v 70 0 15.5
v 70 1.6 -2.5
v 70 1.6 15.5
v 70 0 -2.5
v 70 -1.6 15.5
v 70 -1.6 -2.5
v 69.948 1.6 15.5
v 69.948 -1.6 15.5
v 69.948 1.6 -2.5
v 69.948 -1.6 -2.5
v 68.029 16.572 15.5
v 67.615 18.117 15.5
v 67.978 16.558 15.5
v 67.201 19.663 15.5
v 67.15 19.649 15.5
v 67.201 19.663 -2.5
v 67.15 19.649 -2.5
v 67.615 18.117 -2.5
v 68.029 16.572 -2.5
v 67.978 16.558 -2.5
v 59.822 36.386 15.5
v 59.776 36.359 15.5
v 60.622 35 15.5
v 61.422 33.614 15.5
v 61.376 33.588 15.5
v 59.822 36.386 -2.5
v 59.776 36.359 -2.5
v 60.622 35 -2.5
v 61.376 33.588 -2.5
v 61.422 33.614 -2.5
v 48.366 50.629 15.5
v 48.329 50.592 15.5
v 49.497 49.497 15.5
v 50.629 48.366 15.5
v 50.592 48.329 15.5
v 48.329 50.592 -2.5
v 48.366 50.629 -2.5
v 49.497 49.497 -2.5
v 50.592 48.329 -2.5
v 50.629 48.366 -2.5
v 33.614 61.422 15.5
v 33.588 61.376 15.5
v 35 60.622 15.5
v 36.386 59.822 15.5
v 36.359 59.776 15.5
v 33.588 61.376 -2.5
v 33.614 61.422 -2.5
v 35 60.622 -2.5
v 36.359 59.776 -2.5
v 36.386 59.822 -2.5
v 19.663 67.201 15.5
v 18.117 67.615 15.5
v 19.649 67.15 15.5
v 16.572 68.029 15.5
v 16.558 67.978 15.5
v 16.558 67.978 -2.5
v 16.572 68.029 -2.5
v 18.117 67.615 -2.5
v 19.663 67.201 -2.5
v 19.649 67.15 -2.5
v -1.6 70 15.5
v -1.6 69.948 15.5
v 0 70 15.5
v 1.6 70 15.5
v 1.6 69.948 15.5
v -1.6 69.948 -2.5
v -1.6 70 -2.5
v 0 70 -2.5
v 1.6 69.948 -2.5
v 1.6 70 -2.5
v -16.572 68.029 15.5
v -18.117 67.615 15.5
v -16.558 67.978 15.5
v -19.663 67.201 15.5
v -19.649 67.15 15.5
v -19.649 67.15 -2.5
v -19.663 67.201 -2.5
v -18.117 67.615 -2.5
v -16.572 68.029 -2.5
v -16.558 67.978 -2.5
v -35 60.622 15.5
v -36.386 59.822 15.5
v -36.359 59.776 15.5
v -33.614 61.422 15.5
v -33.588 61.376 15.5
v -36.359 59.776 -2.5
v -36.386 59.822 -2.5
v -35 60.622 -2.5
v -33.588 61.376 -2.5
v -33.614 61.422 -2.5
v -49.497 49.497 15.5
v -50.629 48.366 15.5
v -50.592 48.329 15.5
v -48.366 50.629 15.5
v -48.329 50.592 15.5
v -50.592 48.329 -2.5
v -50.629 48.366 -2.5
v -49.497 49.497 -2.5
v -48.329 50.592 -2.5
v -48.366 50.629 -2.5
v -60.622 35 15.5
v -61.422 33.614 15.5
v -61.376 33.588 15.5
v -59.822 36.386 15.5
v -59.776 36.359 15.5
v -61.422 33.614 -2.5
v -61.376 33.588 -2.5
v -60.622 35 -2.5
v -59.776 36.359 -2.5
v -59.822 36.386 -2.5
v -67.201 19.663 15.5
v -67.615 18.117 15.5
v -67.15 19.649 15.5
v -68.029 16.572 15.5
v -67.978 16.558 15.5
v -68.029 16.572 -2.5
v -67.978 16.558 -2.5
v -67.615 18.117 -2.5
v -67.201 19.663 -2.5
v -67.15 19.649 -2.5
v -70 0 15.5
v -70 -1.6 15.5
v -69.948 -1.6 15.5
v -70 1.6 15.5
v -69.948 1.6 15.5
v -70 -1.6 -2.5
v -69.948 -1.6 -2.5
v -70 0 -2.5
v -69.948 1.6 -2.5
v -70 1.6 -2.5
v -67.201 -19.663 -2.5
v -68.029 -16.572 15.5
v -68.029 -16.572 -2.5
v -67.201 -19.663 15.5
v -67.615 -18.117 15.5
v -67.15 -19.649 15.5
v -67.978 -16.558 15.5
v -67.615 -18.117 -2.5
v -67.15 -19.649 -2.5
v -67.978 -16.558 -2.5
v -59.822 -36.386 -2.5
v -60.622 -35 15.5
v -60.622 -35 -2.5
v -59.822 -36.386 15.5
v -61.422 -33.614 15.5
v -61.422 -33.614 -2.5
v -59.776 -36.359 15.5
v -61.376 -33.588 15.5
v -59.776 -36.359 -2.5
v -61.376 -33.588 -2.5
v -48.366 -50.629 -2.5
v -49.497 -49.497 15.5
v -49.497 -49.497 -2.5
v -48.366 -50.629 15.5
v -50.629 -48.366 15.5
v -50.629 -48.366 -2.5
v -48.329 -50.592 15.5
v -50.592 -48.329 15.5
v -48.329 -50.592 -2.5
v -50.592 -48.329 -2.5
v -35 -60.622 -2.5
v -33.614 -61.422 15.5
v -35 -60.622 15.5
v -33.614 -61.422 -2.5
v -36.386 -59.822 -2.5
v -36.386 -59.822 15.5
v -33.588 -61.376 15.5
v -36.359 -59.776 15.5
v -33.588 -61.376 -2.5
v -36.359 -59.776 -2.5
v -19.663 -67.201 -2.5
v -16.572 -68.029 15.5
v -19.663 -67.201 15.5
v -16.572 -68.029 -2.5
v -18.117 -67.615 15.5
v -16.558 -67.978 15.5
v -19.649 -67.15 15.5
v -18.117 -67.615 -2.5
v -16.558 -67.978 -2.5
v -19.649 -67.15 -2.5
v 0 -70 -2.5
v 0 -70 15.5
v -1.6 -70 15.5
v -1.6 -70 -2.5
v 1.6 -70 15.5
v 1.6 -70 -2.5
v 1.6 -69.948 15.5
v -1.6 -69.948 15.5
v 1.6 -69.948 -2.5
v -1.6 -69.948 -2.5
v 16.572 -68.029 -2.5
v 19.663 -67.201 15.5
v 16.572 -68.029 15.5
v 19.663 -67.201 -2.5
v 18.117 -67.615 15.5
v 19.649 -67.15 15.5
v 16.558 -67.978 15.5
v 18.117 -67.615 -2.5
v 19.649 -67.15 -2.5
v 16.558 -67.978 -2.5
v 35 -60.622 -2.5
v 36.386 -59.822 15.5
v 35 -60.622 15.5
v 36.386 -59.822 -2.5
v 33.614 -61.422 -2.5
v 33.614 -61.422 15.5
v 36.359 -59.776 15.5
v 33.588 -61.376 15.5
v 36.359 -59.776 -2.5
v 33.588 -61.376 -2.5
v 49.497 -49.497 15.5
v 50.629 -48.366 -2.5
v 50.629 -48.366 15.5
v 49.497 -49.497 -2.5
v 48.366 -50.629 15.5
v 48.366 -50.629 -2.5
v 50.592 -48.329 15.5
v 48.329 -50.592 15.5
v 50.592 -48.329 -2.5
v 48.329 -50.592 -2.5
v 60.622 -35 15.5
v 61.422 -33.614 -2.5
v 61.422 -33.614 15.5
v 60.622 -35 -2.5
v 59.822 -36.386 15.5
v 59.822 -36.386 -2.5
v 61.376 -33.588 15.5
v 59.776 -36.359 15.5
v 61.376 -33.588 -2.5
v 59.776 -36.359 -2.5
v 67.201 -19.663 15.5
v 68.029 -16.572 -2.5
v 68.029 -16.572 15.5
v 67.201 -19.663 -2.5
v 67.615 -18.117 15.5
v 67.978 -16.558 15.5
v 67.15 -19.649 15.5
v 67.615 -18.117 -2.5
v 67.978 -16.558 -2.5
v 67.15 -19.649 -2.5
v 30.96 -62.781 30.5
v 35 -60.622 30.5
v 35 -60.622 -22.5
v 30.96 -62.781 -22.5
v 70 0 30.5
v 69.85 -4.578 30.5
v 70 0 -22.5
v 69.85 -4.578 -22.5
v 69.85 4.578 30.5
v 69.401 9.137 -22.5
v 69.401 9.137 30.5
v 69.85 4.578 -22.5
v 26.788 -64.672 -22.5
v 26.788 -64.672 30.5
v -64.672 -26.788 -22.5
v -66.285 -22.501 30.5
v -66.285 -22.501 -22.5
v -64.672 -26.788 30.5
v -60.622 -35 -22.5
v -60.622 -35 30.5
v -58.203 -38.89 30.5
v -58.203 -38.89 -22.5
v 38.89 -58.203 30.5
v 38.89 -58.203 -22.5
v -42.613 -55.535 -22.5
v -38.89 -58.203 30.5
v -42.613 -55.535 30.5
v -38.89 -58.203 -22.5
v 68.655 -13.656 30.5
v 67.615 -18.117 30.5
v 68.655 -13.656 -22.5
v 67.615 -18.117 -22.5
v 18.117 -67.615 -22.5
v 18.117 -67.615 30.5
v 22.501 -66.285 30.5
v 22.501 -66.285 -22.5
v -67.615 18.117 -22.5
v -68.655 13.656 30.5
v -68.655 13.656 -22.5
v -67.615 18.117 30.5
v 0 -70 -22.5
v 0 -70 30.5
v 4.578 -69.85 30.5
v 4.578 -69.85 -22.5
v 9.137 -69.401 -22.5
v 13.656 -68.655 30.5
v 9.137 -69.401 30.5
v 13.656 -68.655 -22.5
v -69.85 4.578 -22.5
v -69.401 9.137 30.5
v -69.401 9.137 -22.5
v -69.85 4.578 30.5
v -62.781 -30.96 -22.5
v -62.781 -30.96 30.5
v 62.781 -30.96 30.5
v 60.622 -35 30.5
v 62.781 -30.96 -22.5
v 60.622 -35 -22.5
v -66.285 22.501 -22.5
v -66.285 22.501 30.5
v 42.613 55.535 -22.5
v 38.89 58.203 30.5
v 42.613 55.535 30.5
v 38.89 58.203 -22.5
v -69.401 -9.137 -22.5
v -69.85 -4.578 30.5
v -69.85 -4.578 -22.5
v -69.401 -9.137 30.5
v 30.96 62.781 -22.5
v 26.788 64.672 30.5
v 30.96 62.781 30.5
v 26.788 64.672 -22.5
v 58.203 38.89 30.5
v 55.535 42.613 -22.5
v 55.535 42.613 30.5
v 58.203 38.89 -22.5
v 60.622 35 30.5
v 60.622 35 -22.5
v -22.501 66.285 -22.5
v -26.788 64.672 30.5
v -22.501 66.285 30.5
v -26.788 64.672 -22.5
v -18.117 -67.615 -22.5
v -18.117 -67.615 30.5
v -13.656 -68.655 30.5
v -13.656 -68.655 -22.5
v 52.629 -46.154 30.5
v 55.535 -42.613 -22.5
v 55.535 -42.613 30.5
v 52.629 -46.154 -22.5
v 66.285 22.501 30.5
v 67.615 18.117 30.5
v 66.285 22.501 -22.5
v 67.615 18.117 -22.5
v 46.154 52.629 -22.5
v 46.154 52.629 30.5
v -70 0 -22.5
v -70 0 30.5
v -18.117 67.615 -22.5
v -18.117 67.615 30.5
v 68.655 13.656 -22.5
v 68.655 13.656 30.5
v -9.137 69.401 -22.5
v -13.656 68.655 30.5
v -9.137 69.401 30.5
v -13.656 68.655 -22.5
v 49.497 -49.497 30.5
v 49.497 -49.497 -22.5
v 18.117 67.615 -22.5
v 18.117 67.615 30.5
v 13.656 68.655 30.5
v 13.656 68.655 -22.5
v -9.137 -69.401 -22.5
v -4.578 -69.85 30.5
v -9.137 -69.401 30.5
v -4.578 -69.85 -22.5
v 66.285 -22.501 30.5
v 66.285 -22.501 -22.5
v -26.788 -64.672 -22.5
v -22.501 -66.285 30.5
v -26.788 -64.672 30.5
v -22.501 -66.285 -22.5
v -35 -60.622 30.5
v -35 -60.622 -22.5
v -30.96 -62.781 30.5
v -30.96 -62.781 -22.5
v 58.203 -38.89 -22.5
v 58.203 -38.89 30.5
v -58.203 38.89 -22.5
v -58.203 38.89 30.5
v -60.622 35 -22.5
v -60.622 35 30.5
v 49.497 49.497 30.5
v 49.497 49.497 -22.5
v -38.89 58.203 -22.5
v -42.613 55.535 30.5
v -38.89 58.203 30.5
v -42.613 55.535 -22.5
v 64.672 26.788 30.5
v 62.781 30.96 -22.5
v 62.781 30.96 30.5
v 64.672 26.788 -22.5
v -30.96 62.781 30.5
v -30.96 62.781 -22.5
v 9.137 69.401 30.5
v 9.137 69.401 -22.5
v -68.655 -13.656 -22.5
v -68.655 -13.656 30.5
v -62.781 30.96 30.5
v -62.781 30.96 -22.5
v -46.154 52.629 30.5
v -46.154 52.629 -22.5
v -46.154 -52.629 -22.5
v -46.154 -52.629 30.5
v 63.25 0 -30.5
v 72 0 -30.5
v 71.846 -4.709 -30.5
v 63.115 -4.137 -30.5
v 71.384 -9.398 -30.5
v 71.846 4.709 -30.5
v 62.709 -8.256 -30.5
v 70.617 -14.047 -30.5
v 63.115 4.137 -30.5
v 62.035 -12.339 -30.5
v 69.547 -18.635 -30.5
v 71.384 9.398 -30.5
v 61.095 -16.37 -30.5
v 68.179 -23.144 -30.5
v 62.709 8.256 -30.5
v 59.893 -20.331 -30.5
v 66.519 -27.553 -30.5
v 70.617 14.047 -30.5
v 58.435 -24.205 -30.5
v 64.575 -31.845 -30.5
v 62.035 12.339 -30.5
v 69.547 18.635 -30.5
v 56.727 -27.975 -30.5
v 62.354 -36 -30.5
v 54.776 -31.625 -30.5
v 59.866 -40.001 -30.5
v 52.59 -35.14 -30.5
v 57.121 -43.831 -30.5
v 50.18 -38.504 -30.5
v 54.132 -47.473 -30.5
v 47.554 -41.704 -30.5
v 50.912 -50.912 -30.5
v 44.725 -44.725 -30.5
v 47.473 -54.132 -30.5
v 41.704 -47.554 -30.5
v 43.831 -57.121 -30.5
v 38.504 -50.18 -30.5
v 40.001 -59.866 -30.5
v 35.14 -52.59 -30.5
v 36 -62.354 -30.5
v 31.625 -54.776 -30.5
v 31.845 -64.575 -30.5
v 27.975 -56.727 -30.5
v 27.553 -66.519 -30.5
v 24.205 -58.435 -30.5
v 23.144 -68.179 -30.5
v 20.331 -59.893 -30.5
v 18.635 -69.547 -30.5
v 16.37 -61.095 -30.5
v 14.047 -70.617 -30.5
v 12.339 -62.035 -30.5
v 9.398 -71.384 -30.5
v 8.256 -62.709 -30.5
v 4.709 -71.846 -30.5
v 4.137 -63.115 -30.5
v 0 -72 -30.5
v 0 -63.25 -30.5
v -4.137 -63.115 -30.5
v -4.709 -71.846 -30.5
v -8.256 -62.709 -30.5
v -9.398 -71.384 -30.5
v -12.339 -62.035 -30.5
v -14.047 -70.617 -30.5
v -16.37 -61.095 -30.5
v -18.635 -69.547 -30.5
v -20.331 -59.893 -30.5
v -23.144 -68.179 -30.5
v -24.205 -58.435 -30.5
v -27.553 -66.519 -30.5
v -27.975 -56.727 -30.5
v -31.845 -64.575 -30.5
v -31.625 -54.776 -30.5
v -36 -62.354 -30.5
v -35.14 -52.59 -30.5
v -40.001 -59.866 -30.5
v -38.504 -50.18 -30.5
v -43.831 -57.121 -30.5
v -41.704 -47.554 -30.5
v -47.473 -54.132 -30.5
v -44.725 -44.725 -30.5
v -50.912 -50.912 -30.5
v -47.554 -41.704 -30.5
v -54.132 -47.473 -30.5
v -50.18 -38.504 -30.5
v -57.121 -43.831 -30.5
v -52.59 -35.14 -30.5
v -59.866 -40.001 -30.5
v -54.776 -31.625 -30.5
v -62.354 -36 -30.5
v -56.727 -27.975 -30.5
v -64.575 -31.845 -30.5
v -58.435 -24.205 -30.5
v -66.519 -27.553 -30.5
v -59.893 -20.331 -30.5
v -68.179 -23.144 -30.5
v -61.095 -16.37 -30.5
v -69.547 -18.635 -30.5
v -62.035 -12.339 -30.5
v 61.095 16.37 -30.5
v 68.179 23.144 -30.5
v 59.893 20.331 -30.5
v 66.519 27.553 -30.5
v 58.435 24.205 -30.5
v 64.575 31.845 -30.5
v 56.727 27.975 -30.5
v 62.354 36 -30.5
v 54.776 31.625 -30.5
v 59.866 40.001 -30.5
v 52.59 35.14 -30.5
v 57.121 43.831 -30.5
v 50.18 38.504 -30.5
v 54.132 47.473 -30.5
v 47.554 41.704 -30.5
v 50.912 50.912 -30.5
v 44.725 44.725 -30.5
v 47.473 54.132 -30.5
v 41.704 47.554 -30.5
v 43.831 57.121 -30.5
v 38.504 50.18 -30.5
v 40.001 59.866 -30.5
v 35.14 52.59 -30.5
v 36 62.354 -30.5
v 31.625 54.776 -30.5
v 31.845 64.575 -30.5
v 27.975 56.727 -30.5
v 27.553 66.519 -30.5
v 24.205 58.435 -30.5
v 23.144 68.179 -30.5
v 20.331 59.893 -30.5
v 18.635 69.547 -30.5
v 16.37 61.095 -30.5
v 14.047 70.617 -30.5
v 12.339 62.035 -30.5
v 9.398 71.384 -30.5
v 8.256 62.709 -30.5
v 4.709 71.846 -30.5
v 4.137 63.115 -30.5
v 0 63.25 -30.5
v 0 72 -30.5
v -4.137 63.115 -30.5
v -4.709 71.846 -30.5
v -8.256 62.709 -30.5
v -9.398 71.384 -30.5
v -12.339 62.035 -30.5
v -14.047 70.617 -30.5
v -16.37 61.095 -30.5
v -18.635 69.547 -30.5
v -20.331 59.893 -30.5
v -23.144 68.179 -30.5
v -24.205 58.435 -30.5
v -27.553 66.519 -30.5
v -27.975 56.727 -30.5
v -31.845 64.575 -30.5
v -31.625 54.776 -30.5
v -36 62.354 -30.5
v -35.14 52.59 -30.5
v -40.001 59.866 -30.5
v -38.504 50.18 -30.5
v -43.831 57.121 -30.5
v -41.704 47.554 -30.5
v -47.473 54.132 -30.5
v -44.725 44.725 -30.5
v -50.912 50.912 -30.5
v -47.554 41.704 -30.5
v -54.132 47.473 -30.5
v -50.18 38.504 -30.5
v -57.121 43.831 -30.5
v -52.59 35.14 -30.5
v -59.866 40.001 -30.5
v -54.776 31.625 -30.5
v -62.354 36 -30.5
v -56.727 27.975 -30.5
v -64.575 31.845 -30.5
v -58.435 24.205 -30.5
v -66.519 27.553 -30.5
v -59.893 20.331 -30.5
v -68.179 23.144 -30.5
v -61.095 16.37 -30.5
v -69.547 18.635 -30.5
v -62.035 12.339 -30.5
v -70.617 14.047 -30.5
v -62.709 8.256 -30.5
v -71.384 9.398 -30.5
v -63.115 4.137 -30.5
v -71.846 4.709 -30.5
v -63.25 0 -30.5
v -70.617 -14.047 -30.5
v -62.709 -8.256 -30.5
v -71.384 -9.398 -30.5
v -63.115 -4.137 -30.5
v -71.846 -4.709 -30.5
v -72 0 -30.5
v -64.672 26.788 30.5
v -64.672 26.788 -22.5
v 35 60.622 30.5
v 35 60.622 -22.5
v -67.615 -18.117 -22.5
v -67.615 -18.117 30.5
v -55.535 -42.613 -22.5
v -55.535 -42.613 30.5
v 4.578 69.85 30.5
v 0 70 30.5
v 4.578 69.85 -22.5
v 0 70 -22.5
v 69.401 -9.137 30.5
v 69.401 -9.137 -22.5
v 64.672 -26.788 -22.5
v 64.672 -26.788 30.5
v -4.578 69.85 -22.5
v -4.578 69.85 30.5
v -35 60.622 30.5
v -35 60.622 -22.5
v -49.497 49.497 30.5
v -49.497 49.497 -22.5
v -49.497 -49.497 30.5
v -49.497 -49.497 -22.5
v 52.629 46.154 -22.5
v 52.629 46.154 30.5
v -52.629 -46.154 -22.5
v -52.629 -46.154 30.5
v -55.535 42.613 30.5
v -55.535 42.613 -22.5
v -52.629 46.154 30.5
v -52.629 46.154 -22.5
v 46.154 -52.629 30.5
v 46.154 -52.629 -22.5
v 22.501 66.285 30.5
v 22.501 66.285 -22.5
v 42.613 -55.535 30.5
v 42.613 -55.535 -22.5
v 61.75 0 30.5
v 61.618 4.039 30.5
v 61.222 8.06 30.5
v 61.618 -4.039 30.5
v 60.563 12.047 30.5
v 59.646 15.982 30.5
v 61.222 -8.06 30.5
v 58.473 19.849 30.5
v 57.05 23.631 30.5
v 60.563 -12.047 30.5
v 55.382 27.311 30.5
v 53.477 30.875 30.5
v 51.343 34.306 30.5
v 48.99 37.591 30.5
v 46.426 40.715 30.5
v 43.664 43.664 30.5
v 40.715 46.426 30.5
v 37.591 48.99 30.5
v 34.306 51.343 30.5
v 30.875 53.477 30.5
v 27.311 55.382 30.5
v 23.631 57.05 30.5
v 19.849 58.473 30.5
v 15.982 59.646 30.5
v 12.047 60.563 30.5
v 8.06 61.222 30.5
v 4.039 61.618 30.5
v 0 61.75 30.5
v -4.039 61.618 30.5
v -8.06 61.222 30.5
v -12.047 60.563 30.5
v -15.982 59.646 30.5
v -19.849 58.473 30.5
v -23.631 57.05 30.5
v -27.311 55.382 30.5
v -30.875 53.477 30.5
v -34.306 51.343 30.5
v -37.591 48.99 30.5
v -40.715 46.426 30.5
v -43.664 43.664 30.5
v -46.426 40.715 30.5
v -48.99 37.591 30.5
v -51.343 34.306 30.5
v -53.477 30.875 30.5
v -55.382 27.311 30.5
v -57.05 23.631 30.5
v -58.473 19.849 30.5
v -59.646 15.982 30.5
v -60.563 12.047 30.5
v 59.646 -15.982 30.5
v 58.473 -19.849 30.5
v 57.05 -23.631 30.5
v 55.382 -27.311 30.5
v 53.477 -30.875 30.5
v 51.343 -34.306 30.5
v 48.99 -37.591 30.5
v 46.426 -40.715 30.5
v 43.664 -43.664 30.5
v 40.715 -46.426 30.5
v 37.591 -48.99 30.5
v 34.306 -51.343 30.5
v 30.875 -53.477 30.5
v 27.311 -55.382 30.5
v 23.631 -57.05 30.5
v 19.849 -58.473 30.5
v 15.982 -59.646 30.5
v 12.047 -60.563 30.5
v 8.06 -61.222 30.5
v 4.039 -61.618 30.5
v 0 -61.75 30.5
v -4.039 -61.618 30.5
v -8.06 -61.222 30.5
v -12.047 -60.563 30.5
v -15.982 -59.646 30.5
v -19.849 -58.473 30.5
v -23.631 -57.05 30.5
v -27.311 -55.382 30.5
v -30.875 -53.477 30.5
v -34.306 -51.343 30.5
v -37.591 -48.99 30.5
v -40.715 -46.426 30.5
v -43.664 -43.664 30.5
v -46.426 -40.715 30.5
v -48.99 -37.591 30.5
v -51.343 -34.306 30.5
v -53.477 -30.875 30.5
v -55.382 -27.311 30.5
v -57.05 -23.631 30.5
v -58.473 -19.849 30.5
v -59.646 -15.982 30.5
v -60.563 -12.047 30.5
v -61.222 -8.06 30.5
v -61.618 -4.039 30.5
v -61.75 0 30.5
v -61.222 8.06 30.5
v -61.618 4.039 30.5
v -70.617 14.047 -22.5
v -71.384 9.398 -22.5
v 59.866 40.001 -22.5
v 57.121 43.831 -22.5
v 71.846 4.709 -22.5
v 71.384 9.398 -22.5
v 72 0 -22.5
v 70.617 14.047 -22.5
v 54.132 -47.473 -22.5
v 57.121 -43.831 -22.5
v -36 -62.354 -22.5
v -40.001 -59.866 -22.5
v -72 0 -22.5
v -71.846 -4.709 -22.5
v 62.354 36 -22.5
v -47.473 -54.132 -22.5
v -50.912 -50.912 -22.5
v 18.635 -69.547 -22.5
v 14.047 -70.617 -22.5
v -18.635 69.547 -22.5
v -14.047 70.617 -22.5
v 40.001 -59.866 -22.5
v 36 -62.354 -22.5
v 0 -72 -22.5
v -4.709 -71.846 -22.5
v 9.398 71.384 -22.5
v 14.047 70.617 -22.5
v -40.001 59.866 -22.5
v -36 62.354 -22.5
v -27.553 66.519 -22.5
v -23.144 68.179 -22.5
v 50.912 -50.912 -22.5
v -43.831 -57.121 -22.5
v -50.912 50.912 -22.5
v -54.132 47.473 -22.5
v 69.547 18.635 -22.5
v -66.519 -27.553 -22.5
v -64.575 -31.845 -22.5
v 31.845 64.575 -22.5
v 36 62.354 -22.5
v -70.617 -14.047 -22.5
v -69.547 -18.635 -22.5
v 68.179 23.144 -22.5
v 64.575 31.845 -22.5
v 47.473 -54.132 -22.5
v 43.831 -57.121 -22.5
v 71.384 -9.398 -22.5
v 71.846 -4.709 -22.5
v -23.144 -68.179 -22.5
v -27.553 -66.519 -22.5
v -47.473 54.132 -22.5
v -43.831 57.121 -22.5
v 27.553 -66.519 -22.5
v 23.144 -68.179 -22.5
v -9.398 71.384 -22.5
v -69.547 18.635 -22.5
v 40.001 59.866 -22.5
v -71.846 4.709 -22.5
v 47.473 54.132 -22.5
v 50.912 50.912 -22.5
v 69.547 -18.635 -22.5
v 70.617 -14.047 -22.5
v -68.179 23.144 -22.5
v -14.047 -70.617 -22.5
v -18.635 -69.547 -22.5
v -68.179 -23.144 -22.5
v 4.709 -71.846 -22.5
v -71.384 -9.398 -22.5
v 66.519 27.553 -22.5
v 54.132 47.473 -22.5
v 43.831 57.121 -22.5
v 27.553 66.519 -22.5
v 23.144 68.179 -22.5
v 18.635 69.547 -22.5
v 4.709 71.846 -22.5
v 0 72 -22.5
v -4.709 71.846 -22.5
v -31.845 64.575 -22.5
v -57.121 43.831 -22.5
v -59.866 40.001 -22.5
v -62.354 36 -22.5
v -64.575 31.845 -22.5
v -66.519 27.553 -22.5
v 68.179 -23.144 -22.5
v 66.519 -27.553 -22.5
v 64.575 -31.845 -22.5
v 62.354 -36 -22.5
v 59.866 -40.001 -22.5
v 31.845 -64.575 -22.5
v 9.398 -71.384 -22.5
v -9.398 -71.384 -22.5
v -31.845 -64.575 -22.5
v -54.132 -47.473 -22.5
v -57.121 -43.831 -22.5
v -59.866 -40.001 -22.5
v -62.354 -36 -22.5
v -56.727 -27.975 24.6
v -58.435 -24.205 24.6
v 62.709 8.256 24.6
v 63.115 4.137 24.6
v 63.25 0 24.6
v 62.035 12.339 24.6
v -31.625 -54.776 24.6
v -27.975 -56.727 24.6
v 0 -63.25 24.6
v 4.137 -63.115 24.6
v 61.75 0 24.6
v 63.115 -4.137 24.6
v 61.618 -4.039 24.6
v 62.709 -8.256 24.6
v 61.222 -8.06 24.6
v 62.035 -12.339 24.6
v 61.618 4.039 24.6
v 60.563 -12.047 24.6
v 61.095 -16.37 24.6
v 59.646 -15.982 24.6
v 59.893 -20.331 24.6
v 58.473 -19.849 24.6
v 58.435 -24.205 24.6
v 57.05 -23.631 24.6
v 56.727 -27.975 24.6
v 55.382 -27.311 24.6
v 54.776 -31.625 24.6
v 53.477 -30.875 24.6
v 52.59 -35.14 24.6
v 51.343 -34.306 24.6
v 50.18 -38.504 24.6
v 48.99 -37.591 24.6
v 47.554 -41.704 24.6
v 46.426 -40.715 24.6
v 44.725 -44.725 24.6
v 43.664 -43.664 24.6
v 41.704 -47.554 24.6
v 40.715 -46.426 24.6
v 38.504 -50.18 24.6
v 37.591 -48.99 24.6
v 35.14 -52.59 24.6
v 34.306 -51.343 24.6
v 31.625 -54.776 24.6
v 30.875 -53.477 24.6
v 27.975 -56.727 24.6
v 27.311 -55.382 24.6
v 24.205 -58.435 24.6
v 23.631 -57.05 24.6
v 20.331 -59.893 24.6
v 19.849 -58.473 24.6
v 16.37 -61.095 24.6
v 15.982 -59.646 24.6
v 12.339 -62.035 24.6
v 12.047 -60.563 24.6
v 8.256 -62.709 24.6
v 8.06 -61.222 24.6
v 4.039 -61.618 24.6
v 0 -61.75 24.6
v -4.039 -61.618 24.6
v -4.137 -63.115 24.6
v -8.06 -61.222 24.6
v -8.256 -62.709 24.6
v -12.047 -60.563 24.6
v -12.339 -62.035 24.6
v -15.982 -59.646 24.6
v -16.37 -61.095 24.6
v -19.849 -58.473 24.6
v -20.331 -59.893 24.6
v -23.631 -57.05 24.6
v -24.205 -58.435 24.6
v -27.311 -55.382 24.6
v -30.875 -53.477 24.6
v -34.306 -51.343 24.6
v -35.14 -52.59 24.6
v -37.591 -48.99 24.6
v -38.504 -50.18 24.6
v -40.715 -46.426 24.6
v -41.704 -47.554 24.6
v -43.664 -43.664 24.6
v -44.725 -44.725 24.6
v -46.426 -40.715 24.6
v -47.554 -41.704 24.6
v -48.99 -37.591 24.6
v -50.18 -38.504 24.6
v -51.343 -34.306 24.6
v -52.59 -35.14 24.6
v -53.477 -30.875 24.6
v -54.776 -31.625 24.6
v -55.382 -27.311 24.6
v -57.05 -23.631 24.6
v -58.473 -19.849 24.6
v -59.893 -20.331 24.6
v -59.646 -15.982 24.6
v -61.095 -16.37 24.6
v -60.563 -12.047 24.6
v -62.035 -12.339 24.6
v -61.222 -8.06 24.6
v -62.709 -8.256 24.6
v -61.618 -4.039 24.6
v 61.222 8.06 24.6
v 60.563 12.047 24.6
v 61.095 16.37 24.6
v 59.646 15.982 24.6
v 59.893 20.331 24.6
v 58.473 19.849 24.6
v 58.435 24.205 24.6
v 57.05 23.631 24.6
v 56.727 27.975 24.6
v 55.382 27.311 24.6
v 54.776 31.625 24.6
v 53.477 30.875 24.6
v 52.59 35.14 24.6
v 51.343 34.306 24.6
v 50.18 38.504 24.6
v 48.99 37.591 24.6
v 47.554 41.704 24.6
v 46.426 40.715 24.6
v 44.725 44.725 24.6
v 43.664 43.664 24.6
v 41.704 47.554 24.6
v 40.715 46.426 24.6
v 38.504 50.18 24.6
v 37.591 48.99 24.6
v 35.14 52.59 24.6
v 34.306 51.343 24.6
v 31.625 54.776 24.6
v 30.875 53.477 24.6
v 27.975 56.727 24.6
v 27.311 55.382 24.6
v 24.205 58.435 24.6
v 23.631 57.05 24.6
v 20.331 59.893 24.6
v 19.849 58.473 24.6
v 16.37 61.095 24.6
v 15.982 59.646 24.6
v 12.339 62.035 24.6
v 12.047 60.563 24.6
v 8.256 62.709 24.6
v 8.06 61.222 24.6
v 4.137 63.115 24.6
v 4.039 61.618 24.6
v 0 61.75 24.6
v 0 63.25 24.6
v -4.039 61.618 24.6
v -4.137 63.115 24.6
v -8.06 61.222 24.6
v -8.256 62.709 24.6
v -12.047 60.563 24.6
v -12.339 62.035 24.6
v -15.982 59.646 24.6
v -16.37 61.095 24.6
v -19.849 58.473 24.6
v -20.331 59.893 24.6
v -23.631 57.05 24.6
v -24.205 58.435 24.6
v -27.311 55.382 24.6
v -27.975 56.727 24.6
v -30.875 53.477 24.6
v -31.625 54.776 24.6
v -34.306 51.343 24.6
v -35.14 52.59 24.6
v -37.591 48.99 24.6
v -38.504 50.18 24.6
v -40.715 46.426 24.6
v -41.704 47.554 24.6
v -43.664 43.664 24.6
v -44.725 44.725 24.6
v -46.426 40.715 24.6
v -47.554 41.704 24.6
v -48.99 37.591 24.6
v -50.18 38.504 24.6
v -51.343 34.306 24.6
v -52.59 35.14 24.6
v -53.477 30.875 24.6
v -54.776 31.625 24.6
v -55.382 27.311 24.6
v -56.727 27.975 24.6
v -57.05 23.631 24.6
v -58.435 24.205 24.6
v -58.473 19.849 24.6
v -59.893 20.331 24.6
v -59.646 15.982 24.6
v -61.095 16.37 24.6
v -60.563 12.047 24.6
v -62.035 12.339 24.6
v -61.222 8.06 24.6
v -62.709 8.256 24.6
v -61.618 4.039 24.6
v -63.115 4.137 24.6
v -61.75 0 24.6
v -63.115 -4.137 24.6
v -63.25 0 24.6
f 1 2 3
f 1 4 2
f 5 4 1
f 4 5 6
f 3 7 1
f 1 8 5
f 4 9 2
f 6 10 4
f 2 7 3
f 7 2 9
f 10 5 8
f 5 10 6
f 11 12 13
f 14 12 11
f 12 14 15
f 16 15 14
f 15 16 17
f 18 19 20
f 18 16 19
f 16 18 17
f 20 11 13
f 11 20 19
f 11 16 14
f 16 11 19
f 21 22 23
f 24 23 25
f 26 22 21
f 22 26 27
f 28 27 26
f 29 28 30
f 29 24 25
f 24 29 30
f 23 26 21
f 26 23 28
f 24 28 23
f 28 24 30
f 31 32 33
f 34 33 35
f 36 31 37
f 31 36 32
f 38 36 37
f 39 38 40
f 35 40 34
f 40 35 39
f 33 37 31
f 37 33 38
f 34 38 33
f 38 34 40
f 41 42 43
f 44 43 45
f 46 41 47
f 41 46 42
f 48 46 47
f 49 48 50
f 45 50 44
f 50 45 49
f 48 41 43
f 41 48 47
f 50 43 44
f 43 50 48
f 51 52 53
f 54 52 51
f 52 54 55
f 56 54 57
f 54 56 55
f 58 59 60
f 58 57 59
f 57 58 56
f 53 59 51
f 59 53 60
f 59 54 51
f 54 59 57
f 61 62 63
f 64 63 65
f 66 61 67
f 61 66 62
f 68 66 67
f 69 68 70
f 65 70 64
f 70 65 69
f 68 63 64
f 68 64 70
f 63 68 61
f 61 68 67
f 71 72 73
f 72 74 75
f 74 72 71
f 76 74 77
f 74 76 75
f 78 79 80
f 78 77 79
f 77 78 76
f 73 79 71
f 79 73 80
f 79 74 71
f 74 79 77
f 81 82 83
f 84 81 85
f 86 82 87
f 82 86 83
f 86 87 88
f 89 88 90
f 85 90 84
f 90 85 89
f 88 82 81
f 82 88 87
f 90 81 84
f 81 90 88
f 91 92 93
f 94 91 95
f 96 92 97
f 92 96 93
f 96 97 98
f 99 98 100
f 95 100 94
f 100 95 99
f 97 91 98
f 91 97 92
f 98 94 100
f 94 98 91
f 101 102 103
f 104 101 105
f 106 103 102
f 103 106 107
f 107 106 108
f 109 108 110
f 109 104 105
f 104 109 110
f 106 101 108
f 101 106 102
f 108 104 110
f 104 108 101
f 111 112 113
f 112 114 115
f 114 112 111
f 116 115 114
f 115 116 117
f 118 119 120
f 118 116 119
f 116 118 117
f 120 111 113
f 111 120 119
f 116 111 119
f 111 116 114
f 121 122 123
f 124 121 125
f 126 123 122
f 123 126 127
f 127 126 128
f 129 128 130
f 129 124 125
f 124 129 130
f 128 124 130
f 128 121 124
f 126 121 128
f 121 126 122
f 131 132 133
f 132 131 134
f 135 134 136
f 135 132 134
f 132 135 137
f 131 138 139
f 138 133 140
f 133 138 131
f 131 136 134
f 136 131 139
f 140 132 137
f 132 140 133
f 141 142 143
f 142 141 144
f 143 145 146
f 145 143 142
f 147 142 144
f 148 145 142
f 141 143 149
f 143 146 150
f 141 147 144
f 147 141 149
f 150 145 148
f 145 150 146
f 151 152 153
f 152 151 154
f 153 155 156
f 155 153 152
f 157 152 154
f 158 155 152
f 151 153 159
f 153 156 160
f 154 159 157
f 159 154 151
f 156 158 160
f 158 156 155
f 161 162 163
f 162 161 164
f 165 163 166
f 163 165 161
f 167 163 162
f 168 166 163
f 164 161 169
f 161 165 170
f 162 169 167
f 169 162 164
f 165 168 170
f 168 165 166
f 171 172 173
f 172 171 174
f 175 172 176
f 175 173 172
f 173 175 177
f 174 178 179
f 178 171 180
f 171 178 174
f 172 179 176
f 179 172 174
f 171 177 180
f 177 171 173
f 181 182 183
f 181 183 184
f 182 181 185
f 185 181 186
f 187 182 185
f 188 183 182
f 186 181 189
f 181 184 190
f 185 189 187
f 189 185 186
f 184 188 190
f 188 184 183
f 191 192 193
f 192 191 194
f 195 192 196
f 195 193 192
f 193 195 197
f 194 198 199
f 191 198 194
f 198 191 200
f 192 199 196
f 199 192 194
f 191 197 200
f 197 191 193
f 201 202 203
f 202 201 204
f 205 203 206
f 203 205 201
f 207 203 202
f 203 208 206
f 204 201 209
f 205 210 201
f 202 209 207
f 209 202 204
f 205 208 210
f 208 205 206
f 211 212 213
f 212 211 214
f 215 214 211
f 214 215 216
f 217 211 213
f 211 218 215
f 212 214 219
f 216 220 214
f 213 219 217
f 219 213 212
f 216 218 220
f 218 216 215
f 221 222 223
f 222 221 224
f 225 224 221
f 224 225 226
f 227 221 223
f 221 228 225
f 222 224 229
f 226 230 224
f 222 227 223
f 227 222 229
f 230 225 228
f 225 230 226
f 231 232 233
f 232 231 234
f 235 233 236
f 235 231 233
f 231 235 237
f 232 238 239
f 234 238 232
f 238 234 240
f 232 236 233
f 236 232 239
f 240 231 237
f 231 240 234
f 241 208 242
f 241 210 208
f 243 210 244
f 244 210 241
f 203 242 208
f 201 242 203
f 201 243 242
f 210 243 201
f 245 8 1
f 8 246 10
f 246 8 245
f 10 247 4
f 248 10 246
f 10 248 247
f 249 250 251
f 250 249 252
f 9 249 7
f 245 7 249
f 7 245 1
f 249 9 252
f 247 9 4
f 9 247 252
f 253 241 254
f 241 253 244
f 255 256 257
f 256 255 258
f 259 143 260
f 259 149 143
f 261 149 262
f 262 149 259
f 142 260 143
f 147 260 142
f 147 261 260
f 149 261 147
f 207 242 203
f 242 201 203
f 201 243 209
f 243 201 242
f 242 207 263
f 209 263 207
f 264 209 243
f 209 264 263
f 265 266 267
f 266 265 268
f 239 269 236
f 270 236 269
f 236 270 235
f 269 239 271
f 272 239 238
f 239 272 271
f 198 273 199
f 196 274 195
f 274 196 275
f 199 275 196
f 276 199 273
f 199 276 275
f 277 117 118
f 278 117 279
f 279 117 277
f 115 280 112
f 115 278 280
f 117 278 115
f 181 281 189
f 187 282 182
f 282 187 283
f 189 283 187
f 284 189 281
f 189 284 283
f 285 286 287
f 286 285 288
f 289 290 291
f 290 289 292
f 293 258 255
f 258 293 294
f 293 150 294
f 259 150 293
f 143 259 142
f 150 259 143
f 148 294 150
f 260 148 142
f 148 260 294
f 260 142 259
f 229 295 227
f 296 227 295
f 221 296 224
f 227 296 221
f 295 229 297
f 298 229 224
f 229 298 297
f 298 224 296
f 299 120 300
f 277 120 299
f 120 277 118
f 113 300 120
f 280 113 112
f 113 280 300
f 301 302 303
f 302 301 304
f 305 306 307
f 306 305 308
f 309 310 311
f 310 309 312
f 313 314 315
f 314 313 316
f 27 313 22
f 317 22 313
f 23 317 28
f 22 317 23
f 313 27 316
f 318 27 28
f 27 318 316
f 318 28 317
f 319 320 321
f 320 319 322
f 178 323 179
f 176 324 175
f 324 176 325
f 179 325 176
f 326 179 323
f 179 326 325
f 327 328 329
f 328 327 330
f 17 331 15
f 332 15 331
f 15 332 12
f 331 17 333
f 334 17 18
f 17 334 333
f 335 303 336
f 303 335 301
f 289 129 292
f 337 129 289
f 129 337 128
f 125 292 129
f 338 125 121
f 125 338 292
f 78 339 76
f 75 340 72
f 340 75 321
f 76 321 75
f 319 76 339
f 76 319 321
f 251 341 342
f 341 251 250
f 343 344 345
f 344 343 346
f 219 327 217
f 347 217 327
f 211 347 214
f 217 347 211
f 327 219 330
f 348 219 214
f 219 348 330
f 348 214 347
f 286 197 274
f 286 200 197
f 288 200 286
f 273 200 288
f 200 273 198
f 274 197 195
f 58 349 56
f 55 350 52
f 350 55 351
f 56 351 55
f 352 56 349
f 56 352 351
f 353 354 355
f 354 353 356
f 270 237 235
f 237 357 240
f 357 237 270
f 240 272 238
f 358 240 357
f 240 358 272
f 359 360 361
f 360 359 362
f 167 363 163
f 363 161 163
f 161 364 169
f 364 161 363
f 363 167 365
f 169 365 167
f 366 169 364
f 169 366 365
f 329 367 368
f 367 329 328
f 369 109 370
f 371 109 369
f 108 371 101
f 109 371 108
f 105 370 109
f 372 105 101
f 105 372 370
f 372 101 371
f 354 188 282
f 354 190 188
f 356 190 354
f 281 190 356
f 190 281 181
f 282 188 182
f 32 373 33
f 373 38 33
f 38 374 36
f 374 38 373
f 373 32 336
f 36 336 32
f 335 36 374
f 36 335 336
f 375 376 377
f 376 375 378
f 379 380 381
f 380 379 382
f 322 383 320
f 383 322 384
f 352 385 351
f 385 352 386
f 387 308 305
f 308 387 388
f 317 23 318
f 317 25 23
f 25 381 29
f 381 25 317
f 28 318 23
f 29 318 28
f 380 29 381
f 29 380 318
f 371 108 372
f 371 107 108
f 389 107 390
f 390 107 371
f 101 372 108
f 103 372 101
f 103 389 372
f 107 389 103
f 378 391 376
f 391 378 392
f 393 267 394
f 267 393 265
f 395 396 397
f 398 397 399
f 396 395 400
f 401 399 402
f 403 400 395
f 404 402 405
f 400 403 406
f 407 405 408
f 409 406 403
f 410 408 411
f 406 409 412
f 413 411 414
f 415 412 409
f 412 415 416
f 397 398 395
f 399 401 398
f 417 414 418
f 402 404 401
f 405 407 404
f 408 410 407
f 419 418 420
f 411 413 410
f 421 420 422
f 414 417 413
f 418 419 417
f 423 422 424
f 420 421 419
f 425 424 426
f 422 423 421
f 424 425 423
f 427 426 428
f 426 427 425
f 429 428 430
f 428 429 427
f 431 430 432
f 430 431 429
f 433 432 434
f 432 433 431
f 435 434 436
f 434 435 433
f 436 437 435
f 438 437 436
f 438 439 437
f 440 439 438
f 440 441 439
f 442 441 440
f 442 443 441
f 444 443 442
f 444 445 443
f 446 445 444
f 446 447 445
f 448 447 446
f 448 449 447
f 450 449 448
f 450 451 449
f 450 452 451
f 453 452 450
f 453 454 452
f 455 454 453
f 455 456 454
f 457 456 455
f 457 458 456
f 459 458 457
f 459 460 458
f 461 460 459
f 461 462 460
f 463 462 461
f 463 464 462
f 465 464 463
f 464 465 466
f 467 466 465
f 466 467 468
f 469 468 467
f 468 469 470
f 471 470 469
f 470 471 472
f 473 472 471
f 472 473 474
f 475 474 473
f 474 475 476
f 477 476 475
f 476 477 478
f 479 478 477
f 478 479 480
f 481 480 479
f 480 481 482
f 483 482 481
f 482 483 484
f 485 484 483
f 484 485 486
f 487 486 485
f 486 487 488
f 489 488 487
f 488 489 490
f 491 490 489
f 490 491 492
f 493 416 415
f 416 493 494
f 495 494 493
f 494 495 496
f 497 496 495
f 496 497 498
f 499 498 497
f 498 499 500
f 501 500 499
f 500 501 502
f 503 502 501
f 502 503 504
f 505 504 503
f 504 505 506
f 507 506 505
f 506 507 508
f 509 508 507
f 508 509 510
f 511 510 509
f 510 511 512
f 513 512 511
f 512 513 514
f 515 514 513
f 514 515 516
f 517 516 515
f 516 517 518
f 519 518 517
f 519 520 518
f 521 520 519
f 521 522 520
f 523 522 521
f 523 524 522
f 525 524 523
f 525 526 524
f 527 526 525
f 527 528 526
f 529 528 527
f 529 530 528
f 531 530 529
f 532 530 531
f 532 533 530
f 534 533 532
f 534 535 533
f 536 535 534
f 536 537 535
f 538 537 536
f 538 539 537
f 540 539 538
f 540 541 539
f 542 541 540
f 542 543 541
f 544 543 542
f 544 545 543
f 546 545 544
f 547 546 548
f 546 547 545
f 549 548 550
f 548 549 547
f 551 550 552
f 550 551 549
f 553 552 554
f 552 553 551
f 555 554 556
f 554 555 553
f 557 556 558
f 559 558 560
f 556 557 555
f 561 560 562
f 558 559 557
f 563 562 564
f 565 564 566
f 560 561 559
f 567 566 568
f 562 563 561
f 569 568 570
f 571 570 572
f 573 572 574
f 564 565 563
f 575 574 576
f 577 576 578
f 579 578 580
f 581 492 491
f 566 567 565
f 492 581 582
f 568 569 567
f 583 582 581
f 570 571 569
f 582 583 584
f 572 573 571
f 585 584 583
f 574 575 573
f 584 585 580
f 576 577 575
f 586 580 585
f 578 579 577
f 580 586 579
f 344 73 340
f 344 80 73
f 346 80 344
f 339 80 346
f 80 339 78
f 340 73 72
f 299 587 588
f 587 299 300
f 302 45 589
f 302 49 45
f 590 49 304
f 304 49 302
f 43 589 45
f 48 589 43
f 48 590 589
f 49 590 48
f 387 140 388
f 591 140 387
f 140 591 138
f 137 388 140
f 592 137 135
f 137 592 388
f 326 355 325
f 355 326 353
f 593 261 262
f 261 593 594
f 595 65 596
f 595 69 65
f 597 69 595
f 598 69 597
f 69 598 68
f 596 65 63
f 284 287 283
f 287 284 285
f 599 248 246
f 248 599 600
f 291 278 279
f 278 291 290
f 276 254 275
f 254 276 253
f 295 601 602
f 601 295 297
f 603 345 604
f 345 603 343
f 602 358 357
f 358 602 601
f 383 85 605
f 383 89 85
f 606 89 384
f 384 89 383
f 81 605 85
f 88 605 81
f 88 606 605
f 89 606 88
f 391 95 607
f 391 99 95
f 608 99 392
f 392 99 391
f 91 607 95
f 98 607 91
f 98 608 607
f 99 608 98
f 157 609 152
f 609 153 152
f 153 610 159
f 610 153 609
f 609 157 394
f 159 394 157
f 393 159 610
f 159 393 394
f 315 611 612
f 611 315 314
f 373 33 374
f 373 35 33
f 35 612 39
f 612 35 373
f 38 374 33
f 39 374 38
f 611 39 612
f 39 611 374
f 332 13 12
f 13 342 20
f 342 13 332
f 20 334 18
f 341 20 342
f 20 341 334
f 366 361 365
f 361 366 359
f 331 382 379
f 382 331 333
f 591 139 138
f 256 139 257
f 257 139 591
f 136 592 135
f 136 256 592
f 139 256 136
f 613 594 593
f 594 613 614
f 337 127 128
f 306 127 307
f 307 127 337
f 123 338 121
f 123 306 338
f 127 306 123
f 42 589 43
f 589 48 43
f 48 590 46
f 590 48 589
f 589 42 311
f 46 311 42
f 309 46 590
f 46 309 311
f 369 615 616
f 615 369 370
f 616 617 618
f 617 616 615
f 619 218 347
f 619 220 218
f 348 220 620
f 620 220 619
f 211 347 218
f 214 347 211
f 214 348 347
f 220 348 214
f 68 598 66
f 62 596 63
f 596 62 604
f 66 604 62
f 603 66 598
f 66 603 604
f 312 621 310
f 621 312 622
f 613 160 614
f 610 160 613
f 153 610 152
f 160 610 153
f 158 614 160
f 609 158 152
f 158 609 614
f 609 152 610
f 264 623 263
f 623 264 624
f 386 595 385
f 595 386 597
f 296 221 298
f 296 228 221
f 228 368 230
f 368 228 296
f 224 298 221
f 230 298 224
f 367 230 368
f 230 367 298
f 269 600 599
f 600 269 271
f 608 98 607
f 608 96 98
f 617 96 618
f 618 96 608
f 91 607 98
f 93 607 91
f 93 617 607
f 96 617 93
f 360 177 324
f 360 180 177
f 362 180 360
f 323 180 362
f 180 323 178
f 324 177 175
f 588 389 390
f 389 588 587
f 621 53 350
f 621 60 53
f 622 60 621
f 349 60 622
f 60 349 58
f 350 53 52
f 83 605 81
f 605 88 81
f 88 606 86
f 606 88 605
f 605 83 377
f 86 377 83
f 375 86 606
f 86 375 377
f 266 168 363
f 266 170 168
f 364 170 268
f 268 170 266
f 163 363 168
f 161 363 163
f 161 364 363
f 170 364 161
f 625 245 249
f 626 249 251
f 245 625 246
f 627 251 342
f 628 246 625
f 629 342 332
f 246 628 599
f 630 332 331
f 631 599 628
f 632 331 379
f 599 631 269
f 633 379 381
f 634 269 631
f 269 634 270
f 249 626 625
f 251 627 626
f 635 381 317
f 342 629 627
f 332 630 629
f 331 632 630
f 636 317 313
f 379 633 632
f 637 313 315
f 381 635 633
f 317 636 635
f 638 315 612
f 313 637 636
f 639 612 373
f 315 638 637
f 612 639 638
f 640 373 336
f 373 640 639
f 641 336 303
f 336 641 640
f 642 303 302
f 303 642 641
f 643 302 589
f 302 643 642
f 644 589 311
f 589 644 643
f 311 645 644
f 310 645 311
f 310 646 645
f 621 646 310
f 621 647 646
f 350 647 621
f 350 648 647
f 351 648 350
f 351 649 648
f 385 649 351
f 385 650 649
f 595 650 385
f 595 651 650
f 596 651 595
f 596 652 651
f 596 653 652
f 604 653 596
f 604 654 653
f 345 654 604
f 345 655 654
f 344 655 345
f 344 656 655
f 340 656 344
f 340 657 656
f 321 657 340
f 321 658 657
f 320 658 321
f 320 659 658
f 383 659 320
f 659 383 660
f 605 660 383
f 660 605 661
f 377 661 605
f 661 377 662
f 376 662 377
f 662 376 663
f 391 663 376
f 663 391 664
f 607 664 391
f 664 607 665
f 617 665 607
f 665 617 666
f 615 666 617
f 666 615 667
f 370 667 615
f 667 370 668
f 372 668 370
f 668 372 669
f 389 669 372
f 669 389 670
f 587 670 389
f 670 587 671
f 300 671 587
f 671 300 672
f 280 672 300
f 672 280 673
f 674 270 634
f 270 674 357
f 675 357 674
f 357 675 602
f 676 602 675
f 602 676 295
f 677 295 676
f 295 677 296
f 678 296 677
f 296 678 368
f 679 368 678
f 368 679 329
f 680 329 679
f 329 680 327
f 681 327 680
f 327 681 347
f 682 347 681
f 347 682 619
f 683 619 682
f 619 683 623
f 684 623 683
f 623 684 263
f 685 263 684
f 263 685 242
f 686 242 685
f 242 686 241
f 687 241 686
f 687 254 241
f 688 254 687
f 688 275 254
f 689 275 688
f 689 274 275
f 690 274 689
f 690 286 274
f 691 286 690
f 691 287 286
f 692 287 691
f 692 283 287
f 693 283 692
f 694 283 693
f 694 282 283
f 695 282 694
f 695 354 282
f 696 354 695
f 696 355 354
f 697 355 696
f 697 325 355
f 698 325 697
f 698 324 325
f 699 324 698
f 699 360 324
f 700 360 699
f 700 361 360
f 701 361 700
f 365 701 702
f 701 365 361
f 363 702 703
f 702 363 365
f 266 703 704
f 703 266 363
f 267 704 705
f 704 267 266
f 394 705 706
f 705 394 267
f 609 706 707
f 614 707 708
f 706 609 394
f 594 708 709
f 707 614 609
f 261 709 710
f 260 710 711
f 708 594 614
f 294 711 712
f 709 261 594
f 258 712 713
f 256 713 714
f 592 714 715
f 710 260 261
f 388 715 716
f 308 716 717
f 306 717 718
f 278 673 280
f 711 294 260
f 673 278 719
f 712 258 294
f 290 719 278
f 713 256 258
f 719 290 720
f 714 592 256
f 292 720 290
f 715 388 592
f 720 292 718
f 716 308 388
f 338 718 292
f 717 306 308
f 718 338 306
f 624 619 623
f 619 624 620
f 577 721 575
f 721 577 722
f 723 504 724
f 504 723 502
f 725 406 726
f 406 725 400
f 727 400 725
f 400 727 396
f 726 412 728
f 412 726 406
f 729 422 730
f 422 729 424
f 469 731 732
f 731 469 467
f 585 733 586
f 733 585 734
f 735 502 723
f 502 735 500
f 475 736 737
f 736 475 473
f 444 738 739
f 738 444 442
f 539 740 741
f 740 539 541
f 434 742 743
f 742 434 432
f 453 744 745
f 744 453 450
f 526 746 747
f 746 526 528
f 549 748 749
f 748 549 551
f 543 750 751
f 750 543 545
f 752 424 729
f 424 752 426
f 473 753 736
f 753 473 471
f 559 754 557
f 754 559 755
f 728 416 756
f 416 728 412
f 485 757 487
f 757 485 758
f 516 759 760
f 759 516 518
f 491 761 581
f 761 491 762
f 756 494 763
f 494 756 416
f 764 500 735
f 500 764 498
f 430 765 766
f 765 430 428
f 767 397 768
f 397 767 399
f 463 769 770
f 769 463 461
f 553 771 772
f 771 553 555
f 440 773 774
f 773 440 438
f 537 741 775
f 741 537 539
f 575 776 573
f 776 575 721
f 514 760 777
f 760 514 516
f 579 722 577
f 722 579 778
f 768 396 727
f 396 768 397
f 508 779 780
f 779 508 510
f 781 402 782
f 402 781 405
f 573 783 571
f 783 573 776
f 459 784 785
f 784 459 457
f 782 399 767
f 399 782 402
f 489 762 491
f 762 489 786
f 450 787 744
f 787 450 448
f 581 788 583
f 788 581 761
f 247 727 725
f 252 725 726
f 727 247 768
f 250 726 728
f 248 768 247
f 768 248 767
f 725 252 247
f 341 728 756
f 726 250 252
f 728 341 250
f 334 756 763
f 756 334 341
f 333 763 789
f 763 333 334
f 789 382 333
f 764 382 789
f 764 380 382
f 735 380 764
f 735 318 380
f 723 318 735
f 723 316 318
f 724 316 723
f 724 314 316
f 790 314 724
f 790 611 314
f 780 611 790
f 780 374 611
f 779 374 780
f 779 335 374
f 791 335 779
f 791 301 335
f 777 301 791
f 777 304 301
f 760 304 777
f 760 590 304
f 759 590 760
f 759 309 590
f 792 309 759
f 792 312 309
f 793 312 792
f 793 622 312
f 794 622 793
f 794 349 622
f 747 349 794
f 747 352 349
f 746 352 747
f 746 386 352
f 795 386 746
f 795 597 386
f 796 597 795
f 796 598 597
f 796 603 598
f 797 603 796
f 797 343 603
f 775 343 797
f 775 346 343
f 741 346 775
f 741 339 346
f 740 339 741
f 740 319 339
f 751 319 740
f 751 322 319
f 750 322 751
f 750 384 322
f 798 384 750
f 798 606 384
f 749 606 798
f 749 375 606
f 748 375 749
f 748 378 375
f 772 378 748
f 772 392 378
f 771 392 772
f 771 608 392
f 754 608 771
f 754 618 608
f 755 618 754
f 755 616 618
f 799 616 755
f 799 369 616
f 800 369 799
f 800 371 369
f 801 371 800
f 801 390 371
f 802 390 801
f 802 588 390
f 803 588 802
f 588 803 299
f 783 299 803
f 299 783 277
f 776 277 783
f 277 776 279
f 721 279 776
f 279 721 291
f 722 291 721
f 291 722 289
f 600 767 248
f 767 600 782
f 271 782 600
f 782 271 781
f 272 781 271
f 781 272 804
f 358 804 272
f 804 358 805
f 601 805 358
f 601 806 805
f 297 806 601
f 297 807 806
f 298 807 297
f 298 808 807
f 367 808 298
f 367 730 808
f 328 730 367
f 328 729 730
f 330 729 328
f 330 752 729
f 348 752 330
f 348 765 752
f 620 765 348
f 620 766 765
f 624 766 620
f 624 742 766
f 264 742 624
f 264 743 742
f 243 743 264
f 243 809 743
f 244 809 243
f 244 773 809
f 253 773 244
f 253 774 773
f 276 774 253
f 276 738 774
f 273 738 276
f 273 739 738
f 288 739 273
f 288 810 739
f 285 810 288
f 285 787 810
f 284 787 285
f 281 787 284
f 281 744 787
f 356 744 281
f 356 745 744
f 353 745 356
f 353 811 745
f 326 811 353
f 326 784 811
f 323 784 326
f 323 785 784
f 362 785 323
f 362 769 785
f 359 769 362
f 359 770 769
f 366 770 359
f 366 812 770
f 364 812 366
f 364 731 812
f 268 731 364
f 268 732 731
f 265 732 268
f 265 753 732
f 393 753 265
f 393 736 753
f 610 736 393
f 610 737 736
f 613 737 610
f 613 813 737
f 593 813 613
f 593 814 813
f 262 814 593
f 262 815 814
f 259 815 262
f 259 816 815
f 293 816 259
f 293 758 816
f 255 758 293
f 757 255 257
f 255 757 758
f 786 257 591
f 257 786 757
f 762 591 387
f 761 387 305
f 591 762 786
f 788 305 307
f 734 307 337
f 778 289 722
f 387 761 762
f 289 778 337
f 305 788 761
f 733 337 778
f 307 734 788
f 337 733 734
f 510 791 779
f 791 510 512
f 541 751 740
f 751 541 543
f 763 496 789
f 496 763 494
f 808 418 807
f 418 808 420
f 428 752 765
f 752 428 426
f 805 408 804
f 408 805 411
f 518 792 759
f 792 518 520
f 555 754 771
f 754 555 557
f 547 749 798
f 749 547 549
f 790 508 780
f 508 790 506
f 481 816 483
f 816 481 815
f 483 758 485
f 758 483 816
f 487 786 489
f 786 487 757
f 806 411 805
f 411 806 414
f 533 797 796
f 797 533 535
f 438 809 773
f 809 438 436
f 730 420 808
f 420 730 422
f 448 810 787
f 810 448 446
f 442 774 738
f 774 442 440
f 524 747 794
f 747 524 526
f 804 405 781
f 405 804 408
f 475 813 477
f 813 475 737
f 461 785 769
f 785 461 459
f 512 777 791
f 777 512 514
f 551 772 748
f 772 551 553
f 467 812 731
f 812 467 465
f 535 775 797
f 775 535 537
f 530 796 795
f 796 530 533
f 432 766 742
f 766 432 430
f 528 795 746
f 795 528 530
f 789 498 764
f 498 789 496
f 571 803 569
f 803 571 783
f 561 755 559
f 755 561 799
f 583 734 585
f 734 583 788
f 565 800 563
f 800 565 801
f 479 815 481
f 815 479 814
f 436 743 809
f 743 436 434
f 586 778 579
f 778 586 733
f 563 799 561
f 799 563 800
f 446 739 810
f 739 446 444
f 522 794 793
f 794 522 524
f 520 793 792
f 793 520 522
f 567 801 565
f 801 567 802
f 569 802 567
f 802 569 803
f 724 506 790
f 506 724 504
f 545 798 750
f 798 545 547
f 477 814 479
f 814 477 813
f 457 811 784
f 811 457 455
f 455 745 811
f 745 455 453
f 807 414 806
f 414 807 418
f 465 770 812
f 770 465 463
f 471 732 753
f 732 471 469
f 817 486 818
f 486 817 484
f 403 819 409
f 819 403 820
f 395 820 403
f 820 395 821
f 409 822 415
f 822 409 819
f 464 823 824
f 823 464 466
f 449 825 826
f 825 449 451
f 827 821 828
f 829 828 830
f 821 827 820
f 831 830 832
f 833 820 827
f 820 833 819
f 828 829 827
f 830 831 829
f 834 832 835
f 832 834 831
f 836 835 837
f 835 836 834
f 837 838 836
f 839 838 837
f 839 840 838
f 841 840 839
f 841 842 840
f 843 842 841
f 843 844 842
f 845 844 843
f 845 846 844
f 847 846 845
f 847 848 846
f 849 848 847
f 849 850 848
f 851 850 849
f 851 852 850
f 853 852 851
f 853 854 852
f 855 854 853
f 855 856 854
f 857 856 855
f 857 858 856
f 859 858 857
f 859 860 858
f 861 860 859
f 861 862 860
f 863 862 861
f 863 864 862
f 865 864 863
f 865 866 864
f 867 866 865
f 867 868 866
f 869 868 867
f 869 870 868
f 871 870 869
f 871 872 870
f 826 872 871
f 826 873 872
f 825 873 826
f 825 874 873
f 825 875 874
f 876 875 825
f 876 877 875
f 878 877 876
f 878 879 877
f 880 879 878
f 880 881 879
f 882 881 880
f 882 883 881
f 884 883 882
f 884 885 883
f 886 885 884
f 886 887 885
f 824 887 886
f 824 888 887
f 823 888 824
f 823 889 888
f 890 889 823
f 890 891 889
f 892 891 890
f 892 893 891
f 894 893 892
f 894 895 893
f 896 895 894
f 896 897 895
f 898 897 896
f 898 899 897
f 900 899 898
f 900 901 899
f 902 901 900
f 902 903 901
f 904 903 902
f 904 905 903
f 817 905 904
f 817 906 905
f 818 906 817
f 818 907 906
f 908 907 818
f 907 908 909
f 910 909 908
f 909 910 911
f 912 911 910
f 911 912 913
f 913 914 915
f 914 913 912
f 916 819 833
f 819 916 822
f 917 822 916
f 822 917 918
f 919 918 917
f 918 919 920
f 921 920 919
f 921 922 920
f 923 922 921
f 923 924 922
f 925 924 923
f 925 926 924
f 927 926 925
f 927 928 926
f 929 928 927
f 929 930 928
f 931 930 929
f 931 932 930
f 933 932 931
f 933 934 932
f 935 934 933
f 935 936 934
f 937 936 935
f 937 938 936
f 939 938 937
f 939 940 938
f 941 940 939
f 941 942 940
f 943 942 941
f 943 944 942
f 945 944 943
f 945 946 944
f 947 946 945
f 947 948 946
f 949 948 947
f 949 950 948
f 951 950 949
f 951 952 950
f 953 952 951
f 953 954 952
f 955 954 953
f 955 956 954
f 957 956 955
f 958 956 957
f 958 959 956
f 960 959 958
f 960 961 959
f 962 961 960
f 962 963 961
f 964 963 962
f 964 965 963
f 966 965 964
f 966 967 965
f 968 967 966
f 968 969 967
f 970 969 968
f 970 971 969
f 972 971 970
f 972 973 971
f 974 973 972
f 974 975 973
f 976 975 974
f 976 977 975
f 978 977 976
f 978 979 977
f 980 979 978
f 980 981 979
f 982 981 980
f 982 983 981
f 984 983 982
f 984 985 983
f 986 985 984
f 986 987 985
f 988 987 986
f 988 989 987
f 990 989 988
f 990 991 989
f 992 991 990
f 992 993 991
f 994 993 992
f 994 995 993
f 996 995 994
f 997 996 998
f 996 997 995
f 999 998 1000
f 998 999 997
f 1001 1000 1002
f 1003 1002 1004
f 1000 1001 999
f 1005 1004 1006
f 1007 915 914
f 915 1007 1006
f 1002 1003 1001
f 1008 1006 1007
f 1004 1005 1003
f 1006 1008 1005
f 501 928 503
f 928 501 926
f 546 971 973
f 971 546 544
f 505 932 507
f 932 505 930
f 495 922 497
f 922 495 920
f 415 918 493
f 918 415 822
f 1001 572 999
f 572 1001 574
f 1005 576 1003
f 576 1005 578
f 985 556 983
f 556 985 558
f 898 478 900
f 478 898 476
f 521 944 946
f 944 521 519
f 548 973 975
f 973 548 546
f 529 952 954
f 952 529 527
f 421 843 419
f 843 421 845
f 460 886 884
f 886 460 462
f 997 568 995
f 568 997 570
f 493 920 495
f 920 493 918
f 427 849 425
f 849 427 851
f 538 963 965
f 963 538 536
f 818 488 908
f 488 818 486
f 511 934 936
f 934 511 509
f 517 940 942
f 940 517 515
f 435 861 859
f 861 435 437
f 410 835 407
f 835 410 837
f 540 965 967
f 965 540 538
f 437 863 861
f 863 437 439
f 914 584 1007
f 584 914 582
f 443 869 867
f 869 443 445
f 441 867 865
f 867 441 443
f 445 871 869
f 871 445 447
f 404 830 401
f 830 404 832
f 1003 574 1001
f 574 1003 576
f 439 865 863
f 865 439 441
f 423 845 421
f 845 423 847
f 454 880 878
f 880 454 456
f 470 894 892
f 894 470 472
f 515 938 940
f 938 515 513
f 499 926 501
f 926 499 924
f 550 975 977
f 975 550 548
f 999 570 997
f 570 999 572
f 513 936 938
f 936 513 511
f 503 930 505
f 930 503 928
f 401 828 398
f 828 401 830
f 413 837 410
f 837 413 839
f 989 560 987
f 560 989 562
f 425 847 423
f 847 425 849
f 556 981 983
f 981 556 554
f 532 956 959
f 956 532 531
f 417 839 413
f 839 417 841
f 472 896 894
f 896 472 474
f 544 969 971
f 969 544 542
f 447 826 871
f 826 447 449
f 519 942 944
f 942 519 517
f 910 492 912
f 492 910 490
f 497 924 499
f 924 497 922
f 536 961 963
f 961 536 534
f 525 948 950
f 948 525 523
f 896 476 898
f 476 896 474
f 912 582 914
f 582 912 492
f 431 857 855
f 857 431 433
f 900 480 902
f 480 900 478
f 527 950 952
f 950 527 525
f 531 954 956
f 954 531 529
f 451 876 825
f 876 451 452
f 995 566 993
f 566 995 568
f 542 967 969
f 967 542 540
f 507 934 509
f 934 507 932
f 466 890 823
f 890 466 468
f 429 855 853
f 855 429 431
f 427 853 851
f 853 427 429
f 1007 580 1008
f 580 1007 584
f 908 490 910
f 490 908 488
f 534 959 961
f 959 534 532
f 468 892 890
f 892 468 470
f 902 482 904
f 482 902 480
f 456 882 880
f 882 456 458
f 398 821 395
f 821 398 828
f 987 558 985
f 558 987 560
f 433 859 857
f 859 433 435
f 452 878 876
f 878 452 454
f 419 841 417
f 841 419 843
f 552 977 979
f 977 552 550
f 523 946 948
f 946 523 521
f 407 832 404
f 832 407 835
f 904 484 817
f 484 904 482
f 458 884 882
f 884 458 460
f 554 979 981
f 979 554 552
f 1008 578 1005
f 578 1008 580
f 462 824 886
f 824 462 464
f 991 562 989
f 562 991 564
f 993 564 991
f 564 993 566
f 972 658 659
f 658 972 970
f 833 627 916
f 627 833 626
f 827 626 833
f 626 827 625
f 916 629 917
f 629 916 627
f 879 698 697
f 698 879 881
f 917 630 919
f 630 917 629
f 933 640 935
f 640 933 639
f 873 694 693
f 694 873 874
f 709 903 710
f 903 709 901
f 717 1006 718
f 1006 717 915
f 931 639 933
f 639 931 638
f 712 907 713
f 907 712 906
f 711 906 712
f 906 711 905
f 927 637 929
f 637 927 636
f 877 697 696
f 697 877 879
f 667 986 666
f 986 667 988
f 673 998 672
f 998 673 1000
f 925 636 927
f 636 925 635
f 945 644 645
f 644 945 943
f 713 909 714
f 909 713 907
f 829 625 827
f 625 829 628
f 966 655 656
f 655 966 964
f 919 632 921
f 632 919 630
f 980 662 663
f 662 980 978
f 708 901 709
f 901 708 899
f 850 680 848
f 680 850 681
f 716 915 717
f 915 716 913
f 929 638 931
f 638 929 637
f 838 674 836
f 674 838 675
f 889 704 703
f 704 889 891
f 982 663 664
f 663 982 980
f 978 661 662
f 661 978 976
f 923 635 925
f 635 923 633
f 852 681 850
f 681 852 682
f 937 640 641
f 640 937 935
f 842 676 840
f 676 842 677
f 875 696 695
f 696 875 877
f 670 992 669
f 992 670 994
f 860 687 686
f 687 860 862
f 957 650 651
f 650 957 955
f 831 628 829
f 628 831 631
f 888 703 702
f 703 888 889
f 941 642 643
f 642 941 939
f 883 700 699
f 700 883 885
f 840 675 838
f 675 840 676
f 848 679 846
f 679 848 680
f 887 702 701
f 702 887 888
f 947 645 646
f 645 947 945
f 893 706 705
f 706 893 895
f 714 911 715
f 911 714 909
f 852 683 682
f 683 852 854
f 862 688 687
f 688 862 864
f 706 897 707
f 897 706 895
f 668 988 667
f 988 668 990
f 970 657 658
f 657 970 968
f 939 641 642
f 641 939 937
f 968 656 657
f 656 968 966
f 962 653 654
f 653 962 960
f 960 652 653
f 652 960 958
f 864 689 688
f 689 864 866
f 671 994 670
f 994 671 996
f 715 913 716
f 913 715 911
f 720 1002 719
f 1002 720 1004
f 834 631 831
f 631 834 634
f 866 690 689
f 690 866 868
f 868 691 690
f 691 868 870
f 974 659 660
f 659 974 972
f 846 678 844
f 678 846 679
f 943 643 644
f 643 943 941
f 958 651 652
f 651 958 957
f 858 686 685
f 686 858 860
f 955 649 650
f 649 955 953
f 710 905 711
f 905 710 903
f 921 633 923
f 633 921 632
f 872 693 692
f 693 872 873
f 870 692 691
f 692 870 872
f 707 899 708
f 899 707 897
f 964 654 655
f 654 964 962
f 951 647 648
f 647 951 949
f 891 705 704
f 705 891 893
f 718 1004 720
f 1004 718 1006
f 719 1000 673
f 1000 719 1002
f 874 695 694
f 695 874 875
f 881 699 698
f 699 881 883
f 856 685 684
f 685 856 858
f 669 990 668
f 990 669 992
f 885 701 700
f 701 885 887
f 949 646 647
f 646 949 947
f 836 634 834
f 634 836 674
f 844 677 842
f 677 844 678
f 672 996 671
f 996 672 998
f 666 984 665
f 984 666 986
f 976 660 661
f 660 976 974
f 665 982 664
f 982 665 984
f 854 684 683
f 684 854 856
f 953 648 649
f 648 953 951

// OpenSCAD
$fn=96;

module ring(od, id, h){
    difference(){
        cylinder(d=od, h=h, center=false);
        translate([0,0,-0.1]) cylinder(d=id, h=h+0.2, center=false);
    }
}

module ht125_cap(){
    // Approximate dimensions for HT 125 end cap
    // Nominal pipe OD ~125mm; cap has socket and closed end
    od_outer = 140;
    od_socket_inner = 126.5;
    wall = (od_outer - od_socket_inner)/2;
    socket_depth = 55;
    end_thickness = 6;
    total_h = socket_depth + end_thickness;

    // External grip ribs
    rib_count = 24;
    rib_depth = 1.6;
    rib_width = 3.2;
    rib_h = 18;
    rib_z0 = total_h - rib_h - 6;

    // Stop ring inside socket
    stop_z = socket_depth - 10;
    stop_th = 3;
    stop_id = 118;

    difference(){
        union(){
            // Main body: socket + end
            cylinder(d=od_outer, h=total_h, center=false);

            // Slight outer collar near opening
            translate([0,0,0])
                cylinder(d=od_outer+4, h=8, center=false);

            // Grip ribs
            for(i=[0:rib_count-1]){
                rotate([0,0,360/rib_count*i])
                    translate([od_outer/2 - rib_depth/2,0,rib_z0])
                        cube([rib_depth, rib_width, rib_h], center=true);
            }
        }

        // Hollow socket
        translate([0,0,-0.1])
            cylinder(d=od_socket_inner, h=socket_depth+0.2, center=false);

        // Inner cavity behind end (leave end_thickness)
        translate([0,0,socket_depth])
            cylinder(d=od_socket_inner-2*1.5, h=end_thickness+0.2, center=false);

        // Internal stop ring (reduce ID at stop position)
        translate([0,0,stop_z])
            cylinder(d=stop_id, h=stop_th, center=false);

        // Small vent/mark dimple on end face
        translate([0,0,total_h-2])
            cylinder(d=3, h=3, center=false);
    }
}

translate([0,0,-(55+6)/2]) ht125_cap();
